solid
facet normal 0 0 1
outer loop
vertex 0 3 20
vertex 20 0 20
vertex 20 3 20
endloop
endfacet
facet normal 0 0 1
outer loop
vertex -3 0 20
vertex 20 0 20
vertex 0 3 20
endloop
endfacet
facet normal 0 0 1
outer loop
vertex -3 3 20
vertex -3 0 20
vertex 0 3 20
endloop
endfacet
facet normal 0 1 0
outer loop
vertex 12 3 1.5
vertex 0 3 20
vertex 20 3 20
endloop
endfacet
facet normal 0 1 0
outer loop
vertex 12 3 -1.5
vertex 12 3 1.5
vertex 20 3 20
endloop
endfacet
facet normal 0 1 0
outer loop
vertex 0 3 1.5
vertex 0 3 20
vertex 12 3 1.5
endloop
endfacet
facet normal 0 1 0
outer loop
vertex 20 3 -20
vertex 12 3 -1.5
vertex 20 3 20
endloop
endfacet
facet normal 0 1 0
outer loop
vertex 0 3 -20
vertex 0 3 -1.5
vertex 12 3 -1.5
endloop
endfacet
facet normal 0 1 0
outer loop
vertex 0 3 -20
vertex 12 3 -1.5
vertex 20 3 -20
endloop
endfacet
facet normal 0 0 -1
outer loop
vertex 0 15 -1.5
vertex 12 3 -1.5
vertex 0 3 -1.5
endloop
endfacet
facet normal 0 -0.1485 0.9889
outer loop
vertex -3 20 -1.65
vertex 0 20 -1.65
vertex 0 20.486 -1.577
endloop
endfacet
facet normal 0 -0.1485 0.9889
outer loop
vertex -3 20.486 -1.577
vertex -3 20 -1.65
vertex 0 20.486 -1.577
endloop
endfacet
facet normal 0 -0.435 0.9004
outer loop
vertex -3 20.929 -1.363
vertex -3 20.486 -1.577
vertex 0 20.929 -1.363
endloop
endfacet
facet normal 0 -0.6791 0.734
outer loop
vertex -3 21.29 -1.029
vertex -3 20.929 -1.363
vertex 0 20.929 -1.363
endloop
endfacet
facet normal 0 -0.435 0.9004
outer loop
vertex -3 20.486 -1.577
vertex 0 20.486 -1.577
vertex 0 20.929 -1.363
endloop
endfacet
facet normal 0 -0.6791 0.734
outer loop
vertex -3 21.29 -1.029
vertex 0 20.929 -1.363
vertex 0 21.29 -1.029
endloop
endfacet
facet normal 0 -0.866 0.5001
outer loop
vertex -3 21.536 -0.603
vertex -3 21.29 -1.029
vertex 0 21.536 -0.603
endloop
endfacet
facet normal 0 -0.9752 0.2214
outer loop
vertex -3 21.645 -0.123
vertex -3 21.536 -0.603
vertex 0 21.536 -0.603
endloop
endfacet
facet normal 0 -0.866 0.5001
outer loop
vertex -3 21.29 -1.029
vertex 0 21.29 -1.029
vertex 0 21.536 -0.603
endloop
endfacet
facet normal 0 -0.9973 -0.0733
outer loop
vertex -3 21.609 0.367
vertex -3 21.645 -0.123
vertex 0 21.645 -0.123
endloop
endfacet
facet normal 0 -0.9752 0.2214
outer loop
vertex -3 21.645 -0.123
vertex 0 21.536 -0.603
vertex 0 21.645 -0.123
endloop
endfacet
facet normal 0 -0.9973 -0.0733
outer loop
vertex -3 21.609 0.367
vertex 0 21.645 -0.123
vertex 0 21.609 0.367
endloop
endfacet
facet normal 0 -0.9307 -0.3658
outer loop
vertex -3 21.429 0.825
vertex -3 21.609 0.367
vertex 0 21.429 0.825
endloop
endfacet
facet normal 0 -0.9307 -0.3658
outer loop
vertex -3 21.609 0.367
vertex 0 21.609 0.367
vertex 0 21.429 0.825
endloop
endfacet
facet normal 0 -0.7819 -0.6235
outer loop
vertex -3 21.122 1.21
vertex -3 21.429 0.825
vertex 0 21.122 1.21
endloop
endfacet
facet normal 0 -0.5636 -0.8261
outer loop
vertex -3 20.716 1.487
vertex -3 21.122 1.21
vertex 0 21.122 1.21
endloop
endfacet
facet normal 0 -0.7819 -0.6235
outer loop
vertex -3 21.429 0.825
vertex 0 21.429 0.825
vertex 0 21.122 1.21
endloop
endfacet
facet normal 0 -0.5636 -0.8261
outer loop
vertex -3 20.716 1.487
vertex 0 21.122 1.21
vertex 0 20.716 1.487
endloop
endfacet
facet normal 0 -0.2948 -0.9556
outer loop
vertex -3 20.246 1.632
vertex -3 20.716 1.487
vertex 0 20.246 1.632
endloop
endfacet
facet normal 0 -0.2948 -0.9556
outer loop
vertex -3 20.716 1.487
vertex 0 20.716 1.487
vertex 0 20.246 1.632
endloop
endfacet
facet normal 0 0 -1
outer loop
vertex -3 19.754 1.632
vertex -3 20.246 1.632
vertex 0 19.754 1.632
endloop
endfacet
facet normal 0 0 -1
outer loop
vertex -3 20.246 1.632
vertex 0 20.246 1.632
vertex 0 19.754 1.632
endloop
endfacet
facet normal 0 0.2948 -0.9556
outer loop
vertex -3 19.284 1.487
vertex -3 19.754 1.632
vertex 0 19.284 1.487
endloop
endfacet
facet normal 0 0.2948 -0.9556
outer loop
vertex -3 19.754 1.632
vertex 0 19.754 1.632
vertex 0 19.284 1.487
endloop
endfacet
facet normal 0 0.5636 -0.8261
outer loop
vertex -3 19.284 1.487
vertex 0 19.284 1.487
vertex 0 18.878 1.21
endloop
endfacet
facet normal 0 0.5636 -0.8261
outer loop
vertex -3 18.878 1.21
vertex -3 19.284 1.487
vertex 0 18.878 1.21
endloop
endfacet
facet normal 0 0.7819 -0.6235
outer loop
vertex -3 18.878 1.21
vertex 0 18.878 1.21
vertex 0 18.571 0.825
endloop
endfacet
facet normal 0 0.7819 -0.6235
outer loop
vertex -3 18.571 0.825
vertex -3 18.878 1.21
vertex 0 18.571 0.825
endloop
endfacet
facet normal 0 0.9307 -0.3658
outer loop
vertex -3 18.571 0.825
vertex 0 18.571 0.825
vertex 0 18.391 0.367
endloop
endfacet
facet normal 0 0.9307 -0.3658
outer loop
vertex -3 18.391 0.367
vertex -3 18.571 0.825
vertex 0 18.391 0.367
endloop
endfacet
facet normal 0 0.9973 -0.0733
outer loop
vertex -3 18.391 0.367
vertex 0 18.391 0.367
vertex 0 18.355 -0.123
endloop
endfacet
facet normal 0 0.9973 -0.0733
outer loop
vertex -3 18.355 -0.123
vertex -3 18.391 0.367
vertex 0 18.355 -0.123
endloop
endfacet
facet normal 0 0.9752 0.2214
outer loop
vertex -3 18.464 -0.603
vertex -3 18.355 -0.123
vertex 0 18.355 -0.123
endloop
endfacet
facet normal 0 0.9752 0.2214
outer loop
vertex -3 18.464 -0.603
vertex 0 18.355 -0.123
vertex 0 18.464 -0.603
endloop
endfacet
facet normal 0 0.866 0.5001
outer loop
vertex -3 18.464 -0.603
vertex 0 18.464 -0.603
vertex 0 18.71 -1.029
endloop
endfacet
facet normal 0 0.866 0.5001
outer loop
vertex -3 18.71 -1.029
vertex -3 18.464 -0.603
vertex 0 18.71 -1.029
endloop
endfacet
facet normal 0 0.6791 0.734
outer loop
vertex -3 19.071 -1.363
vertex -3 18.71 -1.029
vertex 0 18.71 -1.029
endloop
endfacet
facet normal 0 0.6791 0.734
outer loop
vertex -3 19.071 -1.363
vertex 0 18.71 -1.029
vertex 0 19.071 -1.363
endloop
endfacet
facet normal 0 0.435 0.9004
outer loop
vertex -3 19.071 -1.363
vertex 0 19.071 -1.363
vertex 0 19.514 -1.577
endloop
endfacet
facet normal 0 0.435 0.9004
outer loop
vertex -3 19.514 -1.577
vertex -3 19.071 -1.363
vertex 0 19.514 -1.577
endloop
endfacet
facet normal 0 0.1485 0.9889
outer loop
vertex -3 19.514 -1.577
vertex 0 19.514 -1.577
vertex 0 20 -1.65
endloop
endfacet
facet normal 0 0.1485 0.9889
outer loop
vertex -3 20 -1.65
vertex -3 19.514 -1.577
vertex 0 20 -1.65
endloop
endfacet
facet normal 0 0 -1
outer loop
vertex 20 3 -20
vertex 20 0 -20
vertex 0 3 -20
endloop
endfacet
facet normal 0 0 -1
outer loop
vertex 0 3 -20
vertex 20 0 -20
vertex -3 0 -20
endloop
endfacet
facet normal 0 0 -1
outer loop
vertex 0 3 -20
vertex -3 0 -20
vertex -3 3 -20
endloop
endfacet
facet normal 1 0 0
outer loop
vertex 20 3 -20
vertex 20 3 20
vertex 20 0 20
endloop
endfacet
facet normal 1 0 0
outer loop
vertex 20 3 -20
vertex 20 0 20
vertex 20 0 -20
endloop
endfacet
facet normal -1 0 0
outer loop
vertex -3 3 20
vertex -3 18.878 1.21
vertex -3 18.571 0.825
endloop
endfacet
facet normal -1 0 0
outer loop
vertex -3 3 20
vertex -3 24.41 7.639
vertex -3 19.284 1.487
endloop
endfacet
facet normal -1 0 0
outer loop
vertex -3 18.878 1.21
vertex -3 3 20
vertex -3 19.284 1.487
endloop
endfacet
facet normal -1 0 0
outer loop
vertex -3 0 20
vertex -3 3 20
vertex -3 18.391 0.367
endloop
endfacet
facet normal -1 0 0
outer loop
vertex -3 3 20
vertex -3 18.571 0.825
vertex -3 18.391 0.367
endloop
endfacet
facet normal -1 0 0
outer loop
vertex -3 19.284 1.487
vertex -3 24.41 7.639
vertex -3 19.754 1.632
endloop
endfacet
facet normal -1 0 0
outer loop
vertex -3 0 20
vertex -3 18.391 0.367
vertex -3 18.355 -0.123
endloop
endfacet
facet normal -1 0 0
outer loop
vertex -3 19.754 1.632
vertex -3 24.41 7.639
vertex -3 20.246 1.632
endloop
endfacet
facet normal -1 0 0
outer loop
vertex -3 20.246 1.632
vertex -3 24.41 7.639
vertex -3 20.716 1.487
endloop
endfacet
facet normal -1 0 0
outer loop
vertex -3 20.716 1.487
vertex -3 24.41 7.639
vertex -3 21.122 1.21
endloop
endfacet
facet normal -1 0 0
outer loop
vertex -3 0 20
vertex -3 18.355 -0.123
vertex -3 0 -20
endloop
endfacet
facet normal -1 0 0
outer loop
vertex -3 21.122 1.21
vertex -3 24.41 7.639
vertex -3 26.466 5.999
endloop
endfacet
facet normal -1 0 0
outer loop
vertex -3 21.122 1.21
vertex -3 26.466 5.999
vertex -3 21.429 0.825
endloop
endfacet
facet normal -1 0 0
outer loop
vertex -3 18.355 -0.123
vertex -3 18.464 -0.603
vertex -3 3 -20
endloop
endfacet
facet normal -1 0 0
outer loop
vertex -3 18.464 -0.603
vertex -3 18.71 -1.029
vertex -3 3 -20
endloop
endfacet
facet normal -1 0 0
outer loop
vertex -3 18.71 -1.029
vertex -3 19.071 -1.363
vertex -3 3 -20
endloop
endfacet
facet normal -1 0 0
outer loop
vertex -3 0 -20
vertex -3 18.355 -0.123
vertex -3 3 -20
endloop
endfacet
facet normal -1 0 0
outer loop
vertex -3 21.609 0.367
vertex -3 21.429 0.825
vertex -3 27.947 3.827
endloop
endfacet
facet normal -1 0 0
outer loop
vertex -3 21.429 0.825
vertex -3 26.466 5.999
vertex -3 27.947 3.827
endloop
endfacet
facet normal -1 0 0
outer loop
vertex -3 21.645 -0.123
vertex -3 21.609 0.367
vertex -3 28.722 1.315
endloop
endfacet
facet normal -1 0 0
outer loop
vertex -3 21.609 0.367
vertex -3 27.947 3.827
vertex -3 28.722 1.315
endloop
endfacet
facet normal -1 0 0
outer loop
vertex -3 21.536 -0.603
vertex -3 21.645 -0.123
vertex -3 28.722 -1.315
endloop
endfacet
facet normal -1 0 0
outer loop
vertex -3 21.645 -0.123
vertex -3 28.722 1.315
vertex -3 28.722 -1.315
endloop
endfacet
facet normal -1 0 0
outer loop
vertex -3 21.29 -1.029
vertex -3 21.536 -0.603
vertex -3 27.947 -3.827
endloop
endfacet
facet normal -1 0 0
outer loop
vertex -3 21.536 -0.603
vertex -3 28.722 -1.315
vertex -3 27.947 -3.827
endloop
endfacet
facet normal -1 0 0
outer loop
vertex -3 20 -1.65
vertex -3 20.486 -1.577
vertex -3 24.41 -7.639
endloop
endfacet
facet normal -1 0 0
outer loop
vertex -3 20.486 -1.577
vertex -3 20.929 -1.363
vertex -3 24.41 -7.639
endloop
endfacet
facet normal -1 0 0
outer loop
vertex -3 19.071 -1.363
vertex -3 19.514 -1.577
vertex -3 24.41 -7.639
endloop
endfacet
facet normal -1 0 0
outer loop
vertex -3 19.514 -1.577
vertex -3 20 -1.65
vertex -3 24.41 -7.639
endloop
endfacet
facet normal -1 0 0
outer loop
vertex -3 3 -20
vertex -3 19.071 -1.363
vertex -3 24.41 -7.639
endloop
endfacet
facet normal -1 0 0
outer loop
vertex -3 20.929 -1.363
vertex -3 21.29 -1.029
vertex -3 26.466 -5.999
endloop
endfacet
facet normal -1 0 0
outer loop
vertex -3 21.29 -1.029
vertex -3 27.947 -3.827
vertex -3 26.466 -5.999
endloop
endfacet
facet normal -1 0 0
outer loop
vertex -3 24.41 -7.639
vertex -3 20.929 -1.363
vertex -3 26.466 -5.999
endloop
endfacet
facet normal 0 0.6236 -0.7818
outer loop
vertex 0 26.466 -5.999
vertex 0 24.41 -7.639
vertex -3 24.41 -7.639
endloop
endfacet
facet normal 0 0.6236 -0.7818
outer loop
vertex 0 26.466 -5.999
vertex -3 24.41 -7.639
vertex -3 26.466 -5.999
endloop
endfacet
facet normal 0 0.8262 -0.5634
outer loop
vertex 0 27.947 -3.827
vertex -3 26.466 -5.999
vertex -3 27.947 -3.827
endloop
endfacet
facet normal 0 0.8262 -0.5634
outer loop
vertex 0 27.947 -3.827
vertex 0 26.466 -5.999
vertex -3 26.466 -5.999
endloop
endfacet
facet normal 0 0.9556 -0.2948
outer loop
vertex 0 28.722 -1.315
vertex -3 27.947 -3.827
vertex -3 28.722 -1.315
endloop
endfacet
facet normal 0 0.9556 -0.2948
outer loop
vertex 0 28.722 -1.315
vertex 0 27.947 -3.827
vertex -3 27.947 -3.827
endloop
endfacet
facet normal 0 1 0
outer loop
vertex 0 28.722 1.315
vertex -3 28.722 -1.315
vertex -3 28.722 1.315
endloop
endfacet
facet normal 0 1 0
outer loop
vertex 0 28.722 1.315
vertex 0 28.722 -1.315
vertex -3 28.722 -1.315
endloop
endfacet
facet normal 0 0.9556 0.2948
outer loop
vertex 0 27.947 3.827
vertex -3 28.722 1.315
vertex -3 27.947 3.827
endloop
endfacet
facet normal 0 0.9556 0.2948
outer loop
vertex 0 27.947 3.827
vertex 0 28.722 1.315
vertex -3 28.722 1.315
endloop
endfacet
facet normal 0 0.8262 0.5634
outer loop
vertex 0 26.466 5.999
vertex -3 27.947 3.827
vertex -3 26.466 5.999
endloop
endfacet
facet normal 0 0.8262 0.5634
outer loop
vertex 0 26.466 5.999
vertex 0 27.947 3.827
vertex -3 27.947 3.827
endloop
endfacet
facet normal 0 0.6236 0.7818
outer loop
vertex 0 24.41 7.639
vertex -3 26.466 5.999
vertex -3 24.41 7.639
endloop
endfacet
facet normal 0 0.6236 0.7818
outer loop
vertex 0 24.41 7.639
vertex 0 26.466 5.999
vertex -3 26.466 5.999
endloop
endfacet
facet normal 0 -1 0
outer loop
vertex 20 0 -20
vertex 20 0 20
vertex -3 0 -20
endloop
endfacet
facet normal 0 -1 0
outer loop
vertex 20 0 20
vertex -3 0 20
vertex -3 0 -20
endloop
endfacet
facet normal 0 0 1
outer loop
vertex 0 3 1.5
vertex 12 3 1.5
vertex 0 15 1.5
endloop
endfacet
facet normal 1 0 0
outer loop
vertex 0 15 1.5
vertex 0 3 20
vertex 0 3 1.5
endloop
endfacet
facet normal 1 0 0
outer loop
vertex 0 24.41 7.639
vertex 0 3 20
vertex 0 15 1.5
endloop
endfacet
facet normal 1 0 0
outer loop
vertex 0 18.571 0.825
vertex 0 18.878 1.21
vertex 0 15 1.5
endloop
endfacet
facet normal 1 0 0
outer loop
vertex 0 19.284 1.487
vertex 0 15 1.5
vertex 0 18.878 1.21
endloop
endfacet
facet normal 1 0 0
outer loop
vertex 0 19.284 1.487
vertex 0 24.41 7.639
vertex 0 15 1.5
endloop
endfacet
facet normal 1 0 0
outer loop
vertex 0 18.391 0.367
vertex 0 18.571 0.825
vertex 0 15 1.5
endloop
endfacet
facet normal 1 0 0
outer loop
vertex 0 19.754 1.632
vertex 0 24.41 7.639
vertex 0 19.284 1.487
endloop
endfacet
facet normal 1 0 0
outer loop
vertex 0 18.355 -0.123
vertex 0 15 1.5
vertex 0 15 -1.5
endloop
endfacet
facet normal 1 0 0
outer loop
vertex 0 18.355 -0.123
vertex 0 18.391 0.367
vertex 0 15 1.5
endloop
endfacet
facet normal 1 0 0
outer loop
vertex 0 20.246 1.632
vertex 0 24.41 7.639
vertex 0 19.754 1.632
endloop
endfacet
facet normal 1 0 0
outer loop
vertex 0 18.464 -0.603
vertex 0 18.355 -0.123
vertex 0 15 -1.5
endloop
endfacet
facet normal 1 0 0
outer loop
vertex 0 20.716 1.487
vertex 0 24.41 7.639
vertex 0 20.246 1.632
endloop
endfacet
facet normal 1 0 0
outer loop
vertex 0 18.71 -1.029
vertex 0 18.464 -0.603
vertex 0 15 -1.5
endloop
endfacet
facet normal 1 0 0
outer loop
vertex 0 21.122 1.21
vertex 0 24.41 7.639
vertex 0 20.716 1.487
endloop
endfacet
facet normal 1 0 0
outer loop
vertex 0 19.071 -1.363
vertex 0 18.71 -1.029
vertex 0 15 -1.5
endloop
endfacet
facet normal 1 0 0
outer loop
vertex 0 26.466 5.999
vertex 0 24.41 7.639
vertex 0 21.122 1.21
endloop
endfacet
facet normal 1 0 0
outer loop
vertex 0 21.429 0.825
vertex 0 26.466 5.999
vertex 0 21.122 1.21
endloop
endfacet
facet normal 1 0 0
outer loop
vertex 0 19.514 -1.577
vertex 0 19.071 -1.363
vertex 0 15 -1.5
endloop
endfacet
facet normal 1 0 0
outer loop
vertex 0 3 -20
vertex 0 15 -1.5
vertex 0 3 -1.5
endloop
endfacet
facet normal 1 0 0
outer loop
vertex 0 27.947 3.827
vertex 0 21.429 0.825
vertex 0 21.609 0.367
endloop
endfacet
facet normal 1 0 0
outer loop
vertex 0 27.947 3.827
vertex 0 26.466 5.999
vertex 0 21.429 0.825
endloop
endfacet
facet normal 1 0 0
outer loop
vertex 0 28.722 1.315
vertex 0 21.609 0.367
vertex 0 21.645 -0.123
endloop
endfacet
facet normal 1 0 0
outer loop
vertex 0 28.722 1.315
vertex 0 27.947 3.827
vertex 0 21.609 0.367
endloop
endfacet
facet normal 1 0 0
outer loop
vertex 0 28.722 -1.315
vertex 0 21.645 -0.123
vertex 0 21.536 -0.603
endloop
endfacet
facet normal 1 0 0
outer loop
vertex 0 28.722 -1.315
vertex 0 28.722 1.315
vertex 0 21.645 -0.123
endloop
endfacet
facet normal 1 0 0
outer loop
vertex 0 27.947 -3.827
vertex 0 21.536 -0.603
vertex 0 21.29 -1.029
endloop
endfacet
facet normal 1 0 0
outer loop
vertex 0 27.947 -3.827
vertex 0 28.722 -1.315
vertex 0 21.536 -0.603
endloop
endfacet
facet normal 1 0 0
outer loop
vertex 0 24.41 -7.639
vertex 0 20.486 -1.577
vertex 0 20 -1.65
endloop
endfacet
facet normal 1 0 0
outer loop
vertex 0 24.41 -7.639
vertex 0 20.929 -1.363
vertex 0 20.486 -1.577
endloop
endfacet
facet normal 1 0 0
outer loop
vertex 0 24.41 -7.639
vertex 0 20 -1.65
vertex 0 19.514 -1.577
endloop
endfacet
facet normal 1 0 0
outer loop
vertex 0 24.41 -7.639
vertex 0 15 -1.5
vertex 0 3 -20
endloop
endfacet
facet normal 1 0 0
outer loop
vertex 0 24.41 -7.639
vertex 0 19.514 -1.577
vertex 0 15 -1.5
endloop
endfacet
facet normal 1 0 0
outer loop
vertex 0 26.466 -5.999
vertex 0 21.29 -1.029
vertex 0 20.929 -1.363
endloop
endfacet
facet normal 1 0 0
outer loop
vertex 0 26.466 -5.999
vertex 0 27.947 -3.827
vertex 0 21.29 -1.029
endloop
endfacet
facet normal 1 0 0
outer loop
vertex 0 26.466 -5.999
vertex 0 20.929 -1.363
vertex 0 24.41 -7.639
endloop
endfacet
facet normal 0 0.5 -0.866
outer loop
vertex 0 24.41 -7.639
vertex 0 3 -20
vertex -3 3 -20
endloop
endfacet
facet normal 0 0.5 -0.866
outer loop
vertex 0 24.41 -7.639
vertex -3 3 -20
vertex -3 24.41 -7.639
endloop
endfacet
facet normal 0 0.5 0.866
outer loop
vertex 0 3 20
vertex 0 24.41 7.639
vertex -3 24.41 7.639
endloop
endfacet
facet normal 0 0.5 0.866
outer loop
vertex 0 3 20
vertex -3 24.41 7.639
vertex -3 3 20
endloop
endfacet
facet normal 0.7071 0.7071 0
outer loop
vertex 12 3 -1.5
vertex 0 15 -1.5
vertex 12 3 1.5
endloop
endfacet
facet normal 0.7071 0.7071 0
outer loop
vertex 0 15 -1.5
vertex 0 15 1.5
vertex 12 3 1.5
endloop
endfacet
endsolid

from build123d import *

# Parameters (mm, degrees)
EXTRUDE_1_DEPTH     = 3
SKETCH_2_R          = 1.65
CUT_EXTRUDE_1_DEPTH = 4
SKETCH_3_W          = 40
SKETCH_3_H          = 3
EXTRUDE_2_DEPTH     = 20
EXTRUDE_3_DEPTH     = 1.5


with BuildPart() as part:
    # 草图1 → 凸台-拉伸1 (new body)
    with BuildSketch(Plane(origin=(0, 0, 0), x_dir=(0, 0, -1), z_dir=(1, 0, 0))):
        with BuildLine():
            Line((-20, 0), (20, 0))
            Line((20, 0), (20, 3))
            Line((20, 3), (7.638784068, 24.410254038))
            ThreePointArc((7.638784068, 24.410254038), (0, 28.820508076), (-7.638784068, 24.410254038))
            Line((-7.638784068, 24.410254038), (-20, 3))
            Line((-20, 3), (-20, 0))
        make_face()
    extrude(amount=-EXTRUDE_1_DEPTH)

    # 草图2 → 切除-拉伸1 (cut, through all)
    with BuildSketch(Plane(origin=(0, 0, 0), x_dir=(0, 0, -1), z_dir=(1, 0, 0))):
        with Locations((0, 20)):
            Circle(SKETCH_2_R)
    extrude(amount=-CUT_EXTRUDE_1_DEPTH, mode=Mode.SUBTRACT)

    # 草图3 → 凸台-拉伸2 (add)
    with BuildSketch(Plane(origin=(0, 0, 0), x_dir=(0, 0, -1), z_dir=(1, 0, 0))):
        with Locations((0, 1.5)):
            Rectangle(SKETCH_3_W, SKETCH_3_H)
    extrude(amount=EXTRUDE_2_DEPTH)

    # 草图4 → 凸台-拉伸3 (add, symmetric)
    with BuildSketch(Plane.XY):
        Polygon((0, 3), (0, 15), (12, 3), align=None)
    extrude(amount=EXTRUDE_3_DEPTH, both=True)


solid = part.part
